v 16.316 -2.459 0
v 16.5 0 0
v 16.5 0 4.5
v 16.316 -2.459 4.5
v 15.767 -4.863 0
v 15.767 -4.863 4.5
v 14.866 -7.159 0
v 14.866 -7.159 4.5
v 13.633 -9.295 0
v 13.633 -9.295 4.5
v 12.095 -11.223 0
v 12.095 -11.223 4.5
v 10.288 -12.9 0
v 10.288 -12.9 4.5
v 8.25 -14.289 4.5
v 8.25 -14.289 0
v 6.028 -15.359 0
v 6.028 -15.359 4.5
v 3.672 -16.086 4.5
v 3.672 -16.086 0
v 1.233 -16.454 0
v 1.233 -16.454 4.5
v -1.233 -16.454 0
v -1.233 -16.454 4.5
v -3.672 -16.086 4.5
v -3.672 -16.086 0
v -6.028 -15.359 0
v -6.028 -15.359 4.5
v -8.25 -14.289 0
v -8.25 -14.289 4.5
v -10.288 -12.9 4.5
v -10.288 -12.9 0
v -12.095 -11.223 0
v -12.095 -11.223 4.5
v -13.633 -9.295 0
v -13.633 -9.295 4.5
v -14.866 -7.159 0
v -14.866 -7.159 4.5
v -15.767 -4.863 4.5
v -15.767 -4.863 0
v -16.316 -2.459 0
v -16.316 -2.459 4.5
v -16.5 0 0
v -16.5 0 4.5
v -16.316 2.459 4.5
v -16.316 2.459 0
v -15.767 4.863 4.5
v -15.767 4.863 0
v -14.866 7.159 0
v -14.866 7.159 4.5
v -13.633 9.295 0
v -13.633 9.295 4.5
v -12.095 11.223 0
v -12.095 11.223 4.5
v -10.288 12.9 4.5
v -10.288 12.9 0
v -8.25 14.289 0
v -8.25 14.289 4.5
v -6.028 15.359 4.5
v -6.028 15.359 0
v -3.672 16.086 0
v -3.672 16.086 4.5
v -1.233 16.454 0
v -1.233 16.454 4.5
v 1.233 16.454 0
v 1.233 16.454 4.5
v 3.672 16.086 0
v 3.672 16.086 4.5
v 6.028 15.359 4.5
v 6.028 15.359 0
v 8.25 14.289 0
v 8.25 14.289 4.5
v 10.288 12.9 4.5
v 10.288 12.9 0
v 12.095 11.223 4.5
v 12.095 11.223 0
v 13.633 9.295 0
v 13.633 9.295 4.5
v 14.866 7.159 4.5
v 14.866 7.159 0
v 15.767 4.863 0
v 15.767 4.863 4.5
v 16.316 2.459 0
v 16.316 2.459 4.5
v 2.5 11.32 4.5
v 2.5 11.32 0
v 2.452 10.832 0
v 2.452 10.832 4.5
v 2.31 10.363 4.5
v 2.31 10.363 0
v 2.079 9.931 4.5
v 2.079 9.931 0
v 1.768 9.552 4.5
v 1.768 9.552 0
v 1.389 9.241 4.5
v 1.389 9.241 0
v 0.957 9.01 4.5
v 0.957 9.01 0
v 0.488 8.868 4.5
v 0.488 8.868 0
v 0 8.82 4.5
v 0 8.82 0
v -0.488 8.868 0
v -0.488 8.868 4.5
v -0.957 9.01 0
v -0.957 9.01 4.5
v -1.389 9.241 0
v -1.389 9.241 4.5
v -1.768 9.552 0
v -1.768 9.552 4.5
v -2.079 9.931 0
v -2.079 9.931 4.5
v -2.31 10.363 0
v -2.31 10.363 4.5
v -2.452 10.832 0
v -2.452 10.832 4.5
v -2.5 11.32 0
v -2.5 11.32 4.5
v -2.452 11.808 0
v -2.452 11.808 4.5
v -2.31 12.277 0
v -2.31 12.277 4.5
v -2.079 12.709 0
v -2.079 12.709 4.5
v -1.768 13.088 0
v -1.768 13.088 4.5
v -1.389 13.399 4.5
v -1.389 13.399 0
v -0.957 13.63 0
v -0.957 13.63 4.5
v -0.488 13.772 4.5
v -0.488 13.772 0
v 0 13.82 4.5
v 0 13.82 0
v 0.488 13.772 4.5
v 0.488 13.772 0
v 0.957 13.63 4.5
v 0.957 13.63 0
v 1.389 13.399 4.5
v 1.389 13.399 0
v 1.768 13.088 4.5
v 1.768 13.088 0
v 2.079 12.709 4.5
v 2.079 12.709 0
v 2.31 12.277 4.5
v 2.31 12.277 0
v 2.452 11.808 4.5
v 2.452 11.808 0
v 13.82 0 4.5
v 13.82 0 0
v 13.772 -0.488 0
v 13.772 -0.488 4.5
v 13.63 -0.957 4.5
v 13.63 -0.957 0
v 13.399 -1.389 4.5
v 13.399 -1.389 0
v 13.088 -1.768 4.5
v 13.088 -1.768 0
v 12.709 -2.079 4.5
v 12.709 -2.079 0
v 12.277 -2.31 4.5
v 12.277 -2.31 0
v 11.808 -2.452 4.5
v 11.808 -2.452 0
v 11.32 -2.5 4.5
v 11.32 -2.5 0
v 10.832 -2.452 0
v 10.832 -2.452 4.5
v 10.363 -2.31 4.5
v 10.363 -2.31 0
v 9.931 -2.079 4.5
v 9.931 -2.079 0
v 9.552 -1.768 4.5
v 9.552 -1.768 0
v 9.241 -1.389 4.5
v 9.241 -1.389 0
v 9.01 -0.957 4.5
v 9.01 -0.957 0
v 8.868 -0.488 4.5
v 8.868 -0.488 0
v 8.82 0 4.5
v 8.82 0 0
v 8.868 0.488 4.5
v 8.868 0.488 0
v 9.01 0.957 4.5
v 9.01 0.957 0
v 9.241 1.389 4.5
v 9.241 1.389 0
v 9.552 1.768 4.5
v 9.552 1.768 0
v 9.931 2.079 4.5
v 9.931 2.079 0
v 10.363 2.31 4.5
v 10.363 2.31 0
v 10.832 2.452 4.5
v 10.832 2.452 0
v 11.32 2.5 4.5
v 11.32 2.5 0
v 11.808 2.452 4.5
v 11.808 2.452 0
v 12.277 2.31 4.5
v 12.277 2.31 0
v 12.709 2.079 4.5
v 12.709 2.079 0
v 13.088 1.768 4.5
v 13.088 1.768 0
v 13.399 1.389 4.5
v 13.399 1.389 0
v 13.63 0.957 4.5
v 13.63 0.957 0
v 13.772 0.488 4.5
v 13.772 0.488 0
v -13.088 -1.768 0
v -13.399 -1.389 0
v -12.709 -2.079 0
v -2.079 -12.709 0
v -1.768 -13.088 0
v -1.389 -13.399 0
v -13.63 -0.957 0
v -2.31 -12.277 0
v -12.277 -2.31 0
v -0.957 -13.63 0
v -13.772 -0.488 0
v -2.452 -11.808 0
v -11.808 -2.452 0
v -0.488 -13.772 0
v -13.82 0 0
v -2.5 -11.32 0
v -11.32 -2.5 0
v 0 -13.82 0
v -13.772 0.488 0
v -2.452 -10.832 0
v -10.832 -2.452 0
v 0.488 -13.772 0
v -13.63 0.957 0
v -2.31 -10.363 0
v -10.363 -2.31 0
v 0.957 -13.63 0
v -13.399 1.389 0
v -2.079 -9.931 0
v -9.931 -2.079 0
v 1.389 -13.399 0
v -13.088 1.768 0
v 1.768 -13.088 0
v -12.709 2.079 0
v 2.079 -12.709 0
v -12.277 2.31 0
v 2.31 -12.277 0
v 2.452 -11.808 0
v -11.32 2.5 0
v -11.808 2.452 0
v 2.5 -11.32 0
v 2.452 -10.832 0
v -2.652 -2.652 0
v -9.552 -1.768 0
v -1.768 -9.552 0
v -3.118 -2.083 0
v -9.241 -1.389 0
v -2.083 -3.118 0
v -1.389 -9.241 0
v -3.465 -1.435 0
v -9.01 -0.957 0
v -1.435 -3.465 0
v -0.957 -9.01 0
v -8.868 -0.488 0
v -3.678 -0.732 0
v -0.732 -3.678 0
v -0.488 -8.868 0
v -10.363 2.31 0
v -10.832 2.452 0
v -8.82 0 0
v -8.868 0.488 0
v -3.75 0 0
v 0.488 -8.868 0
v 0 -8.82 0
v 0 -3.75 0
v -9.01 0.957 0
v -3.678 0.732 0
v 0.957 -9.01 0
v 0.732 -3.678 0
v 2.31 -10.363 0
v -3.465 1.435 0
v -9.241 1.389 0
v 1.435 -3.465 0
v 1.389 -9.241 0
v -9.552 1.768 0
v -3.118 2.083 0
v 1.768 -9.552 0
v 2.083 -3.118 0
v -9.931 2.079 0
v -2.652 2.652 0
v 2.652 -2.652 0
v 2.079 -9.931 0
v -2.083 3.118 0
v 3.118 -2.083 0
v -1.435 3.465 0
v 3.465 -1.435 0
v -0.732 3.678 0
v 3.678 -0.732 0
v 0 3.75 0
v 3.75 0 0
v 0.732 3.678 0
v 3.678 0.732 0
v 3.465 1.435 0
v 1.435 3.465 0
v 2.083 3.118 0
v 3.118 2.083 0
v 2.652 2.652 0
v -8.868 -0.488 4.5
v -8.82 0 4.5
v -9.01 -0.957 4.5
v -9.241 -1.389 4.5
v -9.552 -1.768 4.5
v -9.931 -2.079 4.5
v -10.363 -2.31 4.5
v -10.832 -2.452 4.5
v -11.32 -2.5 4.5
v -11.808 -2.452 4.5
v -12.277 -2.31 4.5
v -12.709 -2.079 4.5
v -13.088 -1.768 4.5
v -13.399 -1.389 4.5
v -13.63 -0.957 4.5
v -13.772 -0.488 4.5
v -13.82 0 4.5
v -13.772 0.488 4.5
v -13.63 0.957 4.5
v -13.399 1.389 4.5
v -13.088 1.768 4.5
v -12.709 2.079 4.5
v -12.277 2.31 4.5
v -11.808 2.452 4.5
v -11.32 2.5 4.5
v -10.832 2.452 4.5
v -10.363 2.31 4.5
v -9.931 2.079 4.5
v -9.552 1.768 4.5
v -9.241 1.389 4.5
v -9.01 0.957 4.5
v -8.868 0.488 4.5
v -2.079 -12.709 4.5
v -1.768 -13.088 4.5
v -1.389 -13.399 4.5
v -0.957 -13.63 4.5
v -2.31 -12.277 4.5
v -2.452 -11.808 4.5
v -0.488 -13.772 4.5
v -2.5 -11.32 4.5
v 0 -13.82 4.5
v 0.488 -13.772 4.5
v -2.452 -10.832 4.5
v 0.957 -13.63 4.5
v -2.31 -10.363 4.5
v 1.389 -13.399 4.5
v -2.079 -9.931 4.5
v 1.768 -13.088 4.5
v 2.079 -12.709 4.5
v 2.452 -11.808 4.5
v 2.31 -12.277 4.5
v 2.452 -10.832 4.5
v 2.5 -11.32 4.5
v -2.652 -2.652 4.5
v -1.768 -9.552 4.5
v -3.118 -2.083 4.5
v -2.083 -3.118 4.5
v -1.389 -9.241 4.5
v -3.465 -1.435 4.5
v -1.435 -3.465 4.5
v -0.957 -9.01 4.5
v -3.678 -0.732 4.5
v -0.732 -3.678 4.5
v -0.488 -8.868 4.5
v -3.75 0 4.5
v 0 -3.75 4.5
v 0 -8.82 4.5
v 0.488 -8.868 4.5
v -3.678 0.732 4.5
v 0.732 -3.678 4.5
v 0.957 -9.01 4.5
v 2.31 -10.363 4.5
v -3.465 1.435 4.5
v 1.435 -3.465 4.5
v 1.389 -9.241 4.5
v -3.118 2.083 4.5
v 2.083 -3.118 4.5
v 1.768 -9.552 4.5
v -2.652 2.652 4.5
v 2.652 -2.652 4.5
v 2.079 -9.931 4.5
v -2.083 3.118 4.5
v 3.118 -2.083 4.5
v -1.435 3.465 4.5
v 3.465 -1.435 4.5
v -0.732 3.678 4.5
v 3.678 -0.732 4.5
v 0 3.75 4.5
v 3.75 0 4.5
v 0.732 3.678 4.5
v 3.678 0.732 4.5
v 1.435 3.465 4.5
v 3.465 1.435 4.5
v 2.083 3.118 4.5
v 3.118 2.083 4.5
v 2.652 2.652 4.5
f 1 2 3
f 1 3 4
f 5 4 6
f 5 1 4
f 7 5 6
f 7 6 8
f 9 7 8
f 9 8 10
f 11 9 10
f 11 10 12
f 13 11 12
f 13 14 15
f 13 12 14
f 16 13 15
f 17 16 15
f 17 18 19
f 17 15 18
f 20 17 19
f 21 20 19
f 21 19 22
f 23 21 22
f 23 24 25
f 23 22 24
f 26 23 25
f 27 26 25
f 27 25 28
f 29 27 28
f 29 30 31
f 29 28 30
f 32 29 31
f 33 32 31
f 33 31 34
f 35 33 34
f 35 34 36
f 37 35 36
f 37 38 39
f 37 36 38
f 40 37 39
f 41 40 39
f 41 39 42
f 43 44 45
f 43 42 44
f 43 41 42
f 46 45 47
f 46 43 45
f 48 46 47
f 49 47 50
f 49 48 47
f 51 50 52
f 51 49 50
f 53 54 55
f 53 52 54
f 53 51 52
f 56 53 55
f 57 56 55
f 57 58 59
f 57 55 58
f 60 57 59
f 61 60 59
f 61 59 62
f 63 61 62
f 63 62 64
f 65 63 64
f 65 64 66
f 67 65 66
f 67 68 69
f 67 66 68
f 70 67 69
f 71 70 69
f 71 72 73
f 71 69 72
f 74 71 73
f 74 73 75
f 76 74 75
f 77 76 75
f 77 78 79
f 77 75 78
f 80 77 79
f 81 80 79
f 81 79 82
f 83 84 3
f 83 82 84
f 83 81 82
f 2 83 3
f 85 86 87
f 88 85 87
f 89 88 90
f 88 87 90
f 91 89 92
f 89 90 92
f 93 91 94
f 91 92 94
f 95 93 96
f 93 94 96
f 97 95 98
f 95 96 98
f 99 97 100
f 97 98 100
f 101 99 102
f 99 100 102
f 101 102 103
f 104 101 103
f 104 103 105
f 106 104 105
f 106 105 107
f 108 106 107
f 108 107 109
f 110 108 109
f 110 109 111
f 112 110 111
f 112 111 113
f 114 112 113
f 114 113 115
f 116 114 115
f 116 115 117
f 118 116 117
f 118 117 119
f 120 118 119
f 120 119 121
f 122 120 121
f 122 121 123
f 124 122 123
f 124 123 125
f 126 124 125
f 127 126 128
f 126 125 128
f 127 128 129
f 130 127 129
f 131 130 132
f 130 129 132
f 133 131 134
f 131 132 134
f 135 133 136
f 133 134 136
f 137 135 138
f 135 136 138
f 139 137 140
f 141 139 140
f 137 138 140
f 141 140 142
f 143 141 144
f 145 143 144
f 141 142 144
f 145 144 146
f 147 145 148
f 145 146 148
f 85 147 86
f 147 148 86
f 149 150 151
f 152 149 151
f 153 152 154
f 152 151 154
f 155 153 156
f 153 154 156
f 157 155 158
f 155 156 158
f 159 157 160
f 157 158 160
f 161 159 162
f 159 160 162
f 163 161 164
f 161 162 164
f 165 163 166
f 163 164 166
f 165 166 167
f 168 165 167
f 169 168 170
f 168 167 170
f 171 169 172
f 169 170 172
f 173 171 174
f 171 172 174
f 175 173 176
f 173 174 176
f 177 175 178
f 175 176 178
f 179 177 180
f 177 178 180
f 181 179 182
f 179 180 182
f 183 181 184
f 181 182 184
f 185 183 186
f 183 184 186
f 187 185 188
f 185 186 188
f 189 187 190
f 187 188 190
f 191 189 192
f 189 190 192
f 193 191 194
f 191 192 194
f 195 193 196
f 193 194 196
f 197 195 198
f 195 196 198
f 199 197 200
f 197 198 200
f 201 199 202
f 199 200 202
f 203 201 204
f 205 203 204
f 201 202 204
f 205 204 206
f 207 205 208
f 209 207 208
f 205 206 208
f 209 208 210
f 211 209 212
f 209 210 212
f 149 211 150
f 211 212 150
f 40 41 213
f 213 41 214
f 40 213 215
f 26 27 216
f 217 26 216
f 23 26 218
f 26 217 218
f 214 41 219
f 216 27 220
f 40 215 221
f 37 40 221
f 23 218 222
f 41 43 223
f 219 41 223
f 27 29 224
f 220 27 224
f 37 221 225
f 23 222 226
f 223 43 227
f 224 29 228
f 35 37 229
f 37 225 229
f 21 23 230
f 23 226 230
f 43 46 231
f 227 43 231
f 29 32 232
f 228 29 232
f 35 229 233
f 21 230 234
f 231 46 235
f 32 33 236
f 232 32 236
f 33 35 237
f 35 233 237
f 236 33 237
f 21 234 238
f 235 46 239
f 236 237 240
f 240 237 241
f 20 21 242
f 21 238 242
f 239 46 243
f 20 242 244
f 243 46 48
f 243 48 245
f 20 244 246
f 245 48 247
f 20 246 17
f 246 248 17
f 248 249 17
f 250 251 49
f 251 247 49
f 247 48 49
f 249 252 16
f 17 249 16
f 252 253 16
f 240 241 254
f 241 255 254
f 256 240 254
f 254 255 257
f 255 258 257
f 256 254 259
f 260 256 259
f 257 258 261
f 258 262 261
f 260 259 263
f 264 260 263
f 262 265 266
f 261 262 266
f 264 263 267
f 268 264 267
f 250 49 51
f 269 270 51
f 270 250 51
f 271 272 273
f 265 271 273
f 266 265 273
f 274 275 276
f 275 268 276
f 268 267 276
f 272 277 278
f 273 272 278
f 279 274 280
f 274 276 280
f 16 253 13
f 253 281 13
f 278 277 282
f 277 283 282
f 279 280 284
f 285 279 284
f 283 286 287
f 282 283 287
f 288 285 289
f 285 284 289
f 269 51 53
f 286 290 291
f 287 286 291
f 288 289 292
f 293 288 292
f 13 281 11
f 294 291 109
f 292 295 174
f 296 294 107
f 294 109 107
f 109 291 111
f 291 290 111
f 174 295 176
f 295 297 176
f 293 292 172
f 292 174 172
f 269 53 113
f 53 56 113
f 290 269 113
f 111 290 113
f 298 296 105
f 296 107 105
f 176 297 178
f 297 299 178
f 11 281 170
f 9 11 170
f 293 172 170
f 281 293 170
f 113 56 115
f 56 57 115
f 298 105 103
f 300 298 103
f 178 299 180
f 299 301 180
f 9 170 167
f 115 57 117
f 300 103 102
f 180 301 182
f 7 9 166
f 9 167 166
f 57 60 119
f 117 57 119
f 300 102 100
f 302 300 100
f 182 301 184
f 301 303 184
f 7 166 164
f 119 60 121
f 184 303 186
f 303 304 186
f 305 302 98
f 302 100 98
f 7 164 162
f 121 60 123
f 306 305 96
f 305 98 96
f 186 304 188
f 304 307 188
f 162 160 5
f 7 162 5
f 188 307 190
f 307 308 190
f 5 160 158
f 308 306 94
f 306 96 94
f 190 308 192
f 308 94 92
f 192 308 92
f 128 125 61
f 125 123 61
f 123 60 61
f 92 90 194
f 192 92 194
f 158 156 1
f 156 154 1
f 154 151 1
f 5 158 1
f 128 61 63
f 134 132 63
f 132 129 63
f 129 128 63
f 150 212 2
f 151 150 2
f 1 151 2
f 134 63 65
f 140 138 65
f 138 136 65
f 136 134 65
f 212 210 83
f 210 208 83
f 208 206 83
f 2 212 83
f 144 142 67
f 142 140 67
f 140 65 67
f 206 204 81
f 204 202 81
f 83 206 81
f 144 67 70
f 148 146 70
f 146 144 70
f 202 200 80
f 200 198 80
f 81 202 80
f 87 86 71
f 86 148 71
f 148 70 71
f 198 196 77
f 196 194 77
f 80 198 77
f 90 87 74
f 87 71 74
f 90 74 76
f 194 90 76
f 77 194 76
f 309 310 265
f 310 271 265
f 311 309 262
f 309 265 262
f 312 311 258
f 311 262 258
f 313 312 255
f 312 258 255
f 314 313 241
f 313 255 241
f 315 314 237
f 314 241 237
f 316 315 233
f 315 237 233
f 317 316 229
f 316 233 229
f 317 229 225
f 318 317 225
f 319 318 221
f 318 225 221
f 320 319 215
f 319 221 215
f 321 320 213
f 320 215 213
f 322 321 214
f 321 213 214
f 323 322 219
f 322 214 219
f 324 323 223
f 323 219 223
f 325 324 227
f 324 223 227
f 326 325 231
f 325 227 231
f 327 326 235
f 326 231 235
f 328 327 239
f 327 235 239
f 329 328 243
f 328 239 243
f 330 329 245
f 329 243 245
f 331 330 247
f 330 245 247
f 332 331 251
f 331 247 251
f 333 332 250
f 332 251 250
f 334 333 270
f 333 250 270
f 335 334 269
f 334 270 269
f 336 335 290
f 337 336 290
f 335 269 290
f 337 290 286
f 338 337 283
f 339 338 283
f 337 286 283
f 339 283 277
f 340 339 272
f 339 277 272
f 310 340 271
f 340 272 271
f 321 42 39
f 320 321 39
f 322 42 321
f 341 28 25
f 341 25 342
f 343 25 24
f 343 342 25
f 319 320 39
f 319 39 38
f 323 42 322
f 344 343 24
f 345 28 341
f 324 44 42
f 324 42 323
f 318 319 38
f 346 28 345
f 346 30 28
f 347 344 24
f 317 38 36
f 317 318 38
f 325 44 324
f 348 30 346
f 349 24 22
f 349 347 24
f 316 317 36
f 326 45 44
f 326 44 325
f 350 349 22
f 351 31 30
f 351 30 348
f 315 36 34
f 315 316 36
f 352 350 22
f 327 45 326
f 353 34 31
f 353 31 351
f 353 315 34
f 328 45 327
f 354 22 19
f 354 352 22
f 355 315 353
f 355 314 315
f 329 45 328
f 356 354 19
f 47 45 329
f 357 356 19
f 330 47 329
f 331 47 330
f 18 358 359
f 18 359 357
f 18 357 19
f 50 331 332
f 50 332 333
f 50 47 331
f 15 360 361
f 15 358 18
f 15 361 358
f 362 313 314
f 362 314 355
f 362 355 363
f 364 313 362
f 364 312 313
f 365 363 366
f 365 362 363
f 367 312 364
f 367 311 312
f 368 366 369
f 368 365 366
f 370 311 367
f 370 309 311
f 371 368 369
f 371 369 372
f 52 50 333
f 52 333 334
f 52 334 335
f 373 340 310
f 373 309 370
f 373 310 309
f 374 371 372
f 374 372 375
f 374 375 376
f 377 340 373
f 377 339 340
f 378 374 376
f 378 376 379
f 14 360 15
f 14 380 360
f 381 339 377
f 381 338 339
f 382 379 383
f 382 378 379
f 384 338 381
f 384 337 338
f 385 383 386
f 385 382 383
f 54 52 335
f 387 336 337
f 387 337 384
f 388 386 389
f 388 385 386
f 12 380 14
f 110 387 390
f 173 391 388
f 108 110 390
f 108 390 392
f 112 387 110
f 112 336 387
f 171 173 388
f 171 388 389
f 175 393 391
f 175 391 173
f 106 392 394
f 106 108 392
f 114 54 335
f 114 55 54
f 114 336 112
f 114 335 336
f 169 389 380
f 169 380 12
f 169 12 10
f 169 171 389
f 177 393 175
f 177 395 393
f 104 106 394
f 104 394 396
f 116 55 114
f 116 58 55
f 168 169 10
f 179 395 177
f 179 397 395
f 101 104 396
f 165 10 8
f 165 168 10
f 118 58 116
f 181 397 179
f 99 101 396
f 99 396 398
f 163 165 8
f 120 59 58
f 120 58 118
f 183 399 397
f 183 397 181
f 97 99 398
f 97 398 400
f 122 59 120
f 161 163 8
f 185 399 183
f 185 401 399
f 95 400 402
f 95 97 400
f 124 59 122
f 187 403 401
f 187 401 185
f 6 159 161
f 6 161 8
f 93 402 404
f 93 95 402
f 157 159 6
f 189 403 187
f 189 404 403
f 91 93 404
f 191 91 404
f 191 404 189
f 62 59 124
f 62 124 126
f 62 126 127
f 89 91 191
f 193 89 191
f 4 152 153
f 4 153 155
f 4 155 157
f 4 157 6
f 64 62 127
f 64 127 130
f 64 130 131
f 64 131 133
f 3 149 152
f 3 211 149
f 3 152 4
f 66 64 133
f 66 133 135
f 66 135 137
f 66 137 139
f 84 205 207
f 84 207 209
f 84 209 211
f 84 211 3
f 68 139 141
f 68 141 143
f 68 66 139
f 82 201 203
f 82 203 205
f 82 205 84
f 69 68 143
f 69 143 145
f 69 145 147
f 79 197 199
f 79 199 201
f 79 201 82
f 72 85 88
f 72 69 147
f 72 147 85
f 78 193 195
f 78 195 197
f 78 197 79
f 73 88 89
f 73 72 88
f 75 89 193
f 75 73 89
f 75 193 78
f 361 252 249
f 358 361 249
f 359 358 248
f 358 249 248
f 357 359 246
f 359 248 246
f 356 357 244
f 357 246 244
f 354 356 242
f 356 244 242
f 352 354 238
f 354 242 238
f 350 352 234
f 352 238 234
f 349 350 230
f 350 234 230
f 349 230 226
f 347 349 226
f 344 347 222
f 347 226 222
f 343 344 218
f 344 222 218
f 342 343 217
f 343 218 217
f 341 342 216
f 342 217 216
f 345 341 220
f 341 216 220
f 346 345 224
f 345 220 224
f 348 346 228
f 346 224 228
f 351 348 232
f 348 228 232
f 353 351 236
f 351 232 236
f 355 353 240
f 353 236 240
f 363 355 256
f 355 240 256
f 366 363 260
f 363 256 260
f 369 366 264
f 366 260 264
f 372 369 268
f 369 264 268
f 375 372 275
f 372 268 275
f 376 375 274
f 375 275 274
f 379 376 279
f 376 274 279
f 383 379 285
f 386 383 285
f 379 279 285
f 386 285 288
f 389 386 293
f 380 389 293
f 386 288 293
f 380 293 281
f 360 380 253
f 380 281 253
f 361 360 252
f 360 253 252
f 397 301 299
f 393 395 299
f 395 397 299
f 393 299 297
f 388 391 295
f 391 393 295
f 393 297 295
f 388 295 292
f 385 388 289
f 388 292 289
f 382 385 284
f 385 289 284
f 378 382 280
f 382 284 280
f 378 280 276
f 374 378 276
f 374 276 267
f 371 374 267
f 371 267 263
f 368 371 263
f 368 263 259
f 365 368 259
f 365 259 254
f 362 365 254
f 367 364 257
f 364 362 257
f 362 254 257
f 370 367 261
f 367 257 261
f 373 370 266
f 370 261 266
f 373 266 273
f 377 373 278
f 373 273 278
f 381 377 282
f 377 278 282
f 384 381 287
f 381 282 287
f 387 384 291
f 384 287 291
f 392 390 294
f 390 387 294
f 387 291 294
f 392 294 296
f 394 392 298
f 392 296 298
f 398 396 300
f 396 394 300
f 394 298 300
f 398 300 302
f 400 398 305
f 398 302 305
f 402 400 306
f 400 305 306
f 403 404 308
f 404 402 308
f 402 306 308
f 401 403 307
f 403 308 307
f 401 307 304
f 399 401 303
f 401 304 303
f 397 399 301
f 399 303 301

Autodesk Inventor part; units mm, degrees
ref_plane "YZ Plane" through (0, 0, 0) normal (1, 0, 0) x (0, 1, 0)
ref_plane "XZ Plane" through (0, 0, 0) normal (0, 1, 0) x (-1, 0, 0)
ref_plane "XY Plane" through (0, 0, 0) normal (0, 0, 1) x (1, 0, 0)
sketch "Эскиз1" plane through (0, 0, 0) normal (0, 0, 1) x (1, 0, 0)
  circle A0 centre (0, 0) radius 16.5
  circle A1 centre (0, 0) radius 3.75
  circle A2 centre (0, 0) radius 11.32
  circle A3 centre (-11.32, 0) radius 2.5
  circle A4 centre (0, -11.32) radius 2.5
  circle A5 centre (11.32, 0) radius 2.5
  circle A6 centre (0, 11.32) radius 2.5
  dimension "d2" = 22.64
  dimension "d0" = 33
  dimension "d1" = 7.5
  dimension "d3" = 5
  dimension "d6" = 360
extrude "Выдавливание1" add sketch "Эскиз1" along normal blind 4.5 contours A0 | A5 A2 A4 A3 A6
properties part number "проставка для колеса"
